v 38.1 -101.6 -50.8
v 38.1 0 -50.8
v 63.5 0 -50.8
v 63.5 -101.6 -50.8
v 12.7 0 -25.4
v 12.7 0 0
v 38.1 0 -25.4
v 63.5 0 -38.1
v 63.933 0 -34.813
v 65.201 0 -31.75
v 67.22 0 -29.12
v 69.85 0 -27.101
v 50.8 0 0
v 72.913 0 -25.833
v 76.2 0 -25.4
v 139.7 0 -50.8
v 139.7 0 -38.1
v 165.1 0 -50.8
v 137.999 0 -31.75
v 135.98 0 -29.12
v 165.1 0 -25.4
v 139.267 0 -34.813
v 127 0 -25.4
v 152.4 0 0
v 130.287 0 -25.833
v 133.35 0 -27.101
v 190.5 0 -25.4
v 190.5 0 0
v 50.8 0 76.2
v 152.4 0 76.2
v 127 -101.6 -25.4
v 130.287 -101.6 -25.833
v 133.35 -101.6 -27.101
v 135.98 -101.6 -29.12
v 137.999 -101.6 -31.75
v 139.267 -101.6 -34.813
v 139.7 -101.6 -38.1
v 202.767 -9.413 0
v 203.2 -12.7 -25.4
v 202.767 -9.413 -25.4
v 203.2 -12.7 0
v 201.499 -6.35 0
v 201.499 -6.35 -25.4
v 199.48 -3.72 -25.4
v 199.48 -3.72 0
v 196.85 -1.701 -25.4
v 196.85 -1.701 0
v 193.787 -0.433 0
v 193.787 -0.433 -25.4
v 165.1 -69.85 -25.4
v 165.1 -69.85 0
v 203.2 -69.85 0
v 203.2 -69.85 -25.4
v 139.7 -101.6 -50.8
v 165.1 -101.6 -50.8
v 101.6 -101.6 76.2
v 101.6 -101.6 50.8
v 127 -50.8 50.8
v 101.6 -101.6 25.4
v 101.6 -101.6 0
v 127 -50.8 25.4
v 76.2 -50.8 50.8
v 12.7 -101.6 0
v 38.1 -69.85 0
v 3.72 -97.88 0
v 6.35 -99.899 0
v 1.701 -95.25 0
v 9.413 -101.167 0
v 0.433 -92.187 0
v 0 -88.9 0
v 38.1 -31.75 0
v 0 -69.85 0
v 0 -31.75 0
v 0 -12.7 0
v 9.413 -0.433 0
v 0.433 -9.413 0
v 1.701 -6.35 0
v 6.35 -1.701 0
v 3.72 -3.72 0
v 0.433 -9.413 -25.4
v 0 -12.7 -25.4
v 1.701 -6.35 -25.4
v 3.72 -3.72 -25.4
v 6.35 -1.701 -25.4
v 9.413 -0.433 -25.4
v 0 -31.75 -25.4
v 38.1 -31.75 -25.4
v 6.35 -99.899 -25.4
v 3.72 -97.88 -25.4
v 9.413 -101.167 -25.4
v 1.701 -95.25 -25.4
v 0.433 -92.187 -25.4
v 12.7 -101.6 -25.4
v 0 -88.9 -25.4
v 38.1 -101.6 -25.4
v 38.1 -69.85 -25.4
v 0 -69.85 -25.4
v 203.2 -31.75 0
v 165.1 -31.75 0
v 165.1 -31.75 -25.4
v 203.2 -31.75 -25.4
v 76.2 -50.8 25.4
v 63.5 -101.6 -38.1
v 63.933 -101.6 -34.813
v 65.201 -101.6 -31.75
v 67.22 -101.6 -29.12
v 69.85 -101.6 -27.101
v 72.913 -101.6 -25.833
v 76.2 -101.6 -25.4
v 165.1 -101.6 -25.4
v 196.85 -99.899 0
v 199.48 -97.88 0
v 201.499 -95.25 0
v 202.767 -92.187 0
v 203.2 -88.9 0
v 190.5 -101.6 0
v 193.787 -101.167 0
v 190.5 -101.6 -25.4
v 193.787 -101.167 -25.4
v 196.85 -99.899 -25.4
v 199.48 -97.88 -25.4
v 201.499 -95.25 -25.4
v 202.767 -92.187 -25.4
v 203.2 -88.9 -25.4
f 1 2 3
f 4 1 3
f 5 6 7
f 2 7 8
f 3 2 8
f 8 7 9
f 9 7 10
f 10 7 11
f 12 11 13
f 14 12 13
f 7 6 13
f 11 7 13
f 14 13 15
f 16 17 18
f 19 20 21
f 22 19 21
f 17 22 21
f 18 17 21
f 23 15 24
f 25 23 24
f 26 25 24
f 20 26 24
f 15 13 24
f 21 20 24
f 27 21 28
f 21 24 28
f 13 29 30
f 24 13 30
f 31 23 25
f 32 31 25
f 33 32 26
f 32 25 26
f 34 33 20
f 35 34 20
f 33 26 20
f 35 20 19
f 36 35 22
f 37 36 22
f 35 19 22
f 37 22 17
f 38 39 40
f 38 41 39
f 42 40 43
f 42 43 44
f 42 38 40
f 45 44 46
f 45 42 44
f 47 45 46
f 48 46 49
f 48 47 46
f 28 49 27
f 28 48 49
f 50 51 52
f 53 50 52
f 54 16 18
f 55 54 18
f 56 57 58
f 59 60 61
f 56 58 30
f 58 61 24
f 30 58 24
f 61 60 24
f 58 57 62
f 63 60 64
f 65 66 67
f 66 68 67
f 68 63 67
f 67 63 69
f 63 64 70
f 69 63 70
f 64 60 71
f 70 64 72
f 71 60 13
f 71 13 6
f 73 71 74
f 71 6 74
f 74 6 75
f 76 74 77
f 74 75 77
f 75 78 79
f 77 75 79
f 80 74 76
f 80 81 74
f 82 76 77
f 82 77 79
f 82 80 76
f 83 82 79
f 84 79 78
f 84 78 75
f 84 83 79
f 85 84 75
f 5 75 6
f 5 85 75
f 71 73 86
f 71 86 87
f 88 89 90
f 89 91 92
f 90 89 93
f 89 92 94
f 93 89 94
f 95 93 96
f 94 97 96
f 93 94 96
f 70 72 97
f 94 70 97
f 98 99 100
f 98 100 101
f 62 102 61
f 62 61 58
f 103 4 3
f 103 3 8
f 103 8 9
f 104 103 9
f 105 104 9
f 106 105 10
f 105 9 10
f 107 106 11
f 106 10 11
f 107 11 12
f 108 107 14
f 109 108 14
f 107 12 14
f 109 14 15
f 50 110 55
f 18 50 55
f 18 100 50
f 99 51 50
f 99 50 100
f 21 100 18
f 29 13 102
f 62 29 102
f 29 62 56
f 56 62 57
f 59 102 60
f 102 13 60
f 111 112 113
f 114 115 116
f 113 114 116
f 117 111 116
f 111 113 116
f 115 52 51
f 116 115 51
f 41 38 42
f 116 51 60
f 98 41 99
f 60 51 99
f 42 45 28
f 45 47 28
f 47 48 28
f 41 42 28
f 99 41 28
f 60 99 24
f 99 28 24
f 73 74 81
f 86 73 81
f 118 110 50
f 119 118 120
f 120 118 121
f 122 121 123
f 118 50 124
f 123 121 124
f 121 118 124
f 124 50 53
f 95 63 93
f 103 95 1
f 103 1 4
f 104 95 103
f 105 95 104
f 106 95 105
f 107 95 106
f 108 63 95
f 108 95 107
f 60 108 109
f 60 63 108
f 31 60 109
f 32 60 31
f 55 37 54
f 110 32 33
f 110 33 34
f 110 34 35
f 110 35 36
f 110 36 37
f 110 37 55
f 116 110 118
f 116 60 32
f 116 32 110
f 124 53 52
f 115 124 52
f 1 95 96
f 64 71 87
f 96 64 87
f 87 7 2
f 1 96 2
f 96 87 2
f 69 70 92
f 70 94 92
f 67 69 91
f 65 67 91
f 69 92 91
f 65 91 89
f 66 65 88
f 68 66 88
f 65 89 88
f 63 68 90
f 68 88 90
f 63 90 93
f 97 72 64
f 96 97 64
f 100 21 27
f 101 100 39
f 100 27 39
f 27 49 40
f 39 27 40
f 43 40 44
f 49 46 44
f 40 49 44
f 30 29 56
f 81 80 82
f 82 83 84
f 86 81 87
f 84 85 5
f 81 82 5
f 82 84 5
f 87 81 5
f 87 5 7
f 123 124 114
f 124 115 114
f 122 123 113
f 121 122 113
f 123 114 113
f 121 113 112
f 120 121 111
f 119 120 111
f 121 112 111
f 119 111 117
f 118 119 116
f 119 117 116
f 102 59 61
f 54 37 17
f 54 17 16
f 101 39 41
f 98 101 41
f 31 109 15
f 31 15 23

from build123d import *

# Parameters (mm, degrees)
F1_DEPTH = 101.6
F3_DEPTH = 76.2
F4_W     = 50.8
F4_H     = 25.4
F5_DEPTH = 203.201
F6_W     = 38.1
F6_H     = 38.1
F7_DEPTH = 50.801
F8_R     = 12.7


with BuildPart() as f1:
    # F0 (on Front) → F1 (new body)
    with BuildSketch(Plane.XZ):
        with BuildLine():
            Line((203.2, 0), (0, 0))
            Line((0, 0), (0, -25.4))
            Line((0, -25.4), (38.1, -25.4))
            Line((38.1, -25.4), (38.1, -50.8))
            Line((38.1, -50.8), (63.5, -50.8))
            Line((63.5, -50.8), (63.5, -38.1))
            ThreePointArc((63.5, -38.1), (67.219744, -29.119744), (76.2, -25.4))
            Line((76.2, -25.4), (127, -25.4))
            ThreePointArc((127, -25.4), (135.980256, -29.119744), (139.7, -38.1))
            Line((139.7, -38.1), (139.7, -50.8))
            Line((139.7, -50.8), (165.1, -50.8))
            Line((165.1, -50.8), (165.1, -25.4))
            Line((165.1, -25.4), (203.2, -25.4))
            Line((203.2, -25.4), (203.2, 0))
        make_face()
    extrude(amount=F1_DEPTH)

    # F2 (on Top) → F3 (join)
    with BuildSketch(Plane.XY):
        Polygon((152.4, 0), (50.8, 0), (101.6, -101.6), align=None)
    extrude(amount=F3_DEPTH)

    # F4 (on Right) → F5 (cut, through all)
    with BuildSketch(Plane.YZ):
        with Locations((-76.2, 38.1)):
            Rectangle(F4_W, F4_H)
    extrude(amount=F5_DEPTH, mode=Mode.SUBTRACT)

    # F6 (on Top) → F7 (cut, through all)
    with BuildSketch(Plane.XY):
        with Locations((19.05, -50.8)):
            Rectangle(F6_W, F6_H)
        with Locations((184.15, -50.8)):
            Rectangle(F6_W, F6_H)
    extrude(amount=-F7_DEPTH, mode=Mode.SUBTRACT)

    # F8
    f8_edges = [f1.edges().sort_by_distance(p)[0] for p in [
        (0, -101.6, -12.7),
        (0, 0, -12.7),
        (203.2, 0, -12.7),
        (203.2, -101.6, -12.7),
    ]]
    fillet(f8_edges, radius=F8_R)


solid = f1.part
